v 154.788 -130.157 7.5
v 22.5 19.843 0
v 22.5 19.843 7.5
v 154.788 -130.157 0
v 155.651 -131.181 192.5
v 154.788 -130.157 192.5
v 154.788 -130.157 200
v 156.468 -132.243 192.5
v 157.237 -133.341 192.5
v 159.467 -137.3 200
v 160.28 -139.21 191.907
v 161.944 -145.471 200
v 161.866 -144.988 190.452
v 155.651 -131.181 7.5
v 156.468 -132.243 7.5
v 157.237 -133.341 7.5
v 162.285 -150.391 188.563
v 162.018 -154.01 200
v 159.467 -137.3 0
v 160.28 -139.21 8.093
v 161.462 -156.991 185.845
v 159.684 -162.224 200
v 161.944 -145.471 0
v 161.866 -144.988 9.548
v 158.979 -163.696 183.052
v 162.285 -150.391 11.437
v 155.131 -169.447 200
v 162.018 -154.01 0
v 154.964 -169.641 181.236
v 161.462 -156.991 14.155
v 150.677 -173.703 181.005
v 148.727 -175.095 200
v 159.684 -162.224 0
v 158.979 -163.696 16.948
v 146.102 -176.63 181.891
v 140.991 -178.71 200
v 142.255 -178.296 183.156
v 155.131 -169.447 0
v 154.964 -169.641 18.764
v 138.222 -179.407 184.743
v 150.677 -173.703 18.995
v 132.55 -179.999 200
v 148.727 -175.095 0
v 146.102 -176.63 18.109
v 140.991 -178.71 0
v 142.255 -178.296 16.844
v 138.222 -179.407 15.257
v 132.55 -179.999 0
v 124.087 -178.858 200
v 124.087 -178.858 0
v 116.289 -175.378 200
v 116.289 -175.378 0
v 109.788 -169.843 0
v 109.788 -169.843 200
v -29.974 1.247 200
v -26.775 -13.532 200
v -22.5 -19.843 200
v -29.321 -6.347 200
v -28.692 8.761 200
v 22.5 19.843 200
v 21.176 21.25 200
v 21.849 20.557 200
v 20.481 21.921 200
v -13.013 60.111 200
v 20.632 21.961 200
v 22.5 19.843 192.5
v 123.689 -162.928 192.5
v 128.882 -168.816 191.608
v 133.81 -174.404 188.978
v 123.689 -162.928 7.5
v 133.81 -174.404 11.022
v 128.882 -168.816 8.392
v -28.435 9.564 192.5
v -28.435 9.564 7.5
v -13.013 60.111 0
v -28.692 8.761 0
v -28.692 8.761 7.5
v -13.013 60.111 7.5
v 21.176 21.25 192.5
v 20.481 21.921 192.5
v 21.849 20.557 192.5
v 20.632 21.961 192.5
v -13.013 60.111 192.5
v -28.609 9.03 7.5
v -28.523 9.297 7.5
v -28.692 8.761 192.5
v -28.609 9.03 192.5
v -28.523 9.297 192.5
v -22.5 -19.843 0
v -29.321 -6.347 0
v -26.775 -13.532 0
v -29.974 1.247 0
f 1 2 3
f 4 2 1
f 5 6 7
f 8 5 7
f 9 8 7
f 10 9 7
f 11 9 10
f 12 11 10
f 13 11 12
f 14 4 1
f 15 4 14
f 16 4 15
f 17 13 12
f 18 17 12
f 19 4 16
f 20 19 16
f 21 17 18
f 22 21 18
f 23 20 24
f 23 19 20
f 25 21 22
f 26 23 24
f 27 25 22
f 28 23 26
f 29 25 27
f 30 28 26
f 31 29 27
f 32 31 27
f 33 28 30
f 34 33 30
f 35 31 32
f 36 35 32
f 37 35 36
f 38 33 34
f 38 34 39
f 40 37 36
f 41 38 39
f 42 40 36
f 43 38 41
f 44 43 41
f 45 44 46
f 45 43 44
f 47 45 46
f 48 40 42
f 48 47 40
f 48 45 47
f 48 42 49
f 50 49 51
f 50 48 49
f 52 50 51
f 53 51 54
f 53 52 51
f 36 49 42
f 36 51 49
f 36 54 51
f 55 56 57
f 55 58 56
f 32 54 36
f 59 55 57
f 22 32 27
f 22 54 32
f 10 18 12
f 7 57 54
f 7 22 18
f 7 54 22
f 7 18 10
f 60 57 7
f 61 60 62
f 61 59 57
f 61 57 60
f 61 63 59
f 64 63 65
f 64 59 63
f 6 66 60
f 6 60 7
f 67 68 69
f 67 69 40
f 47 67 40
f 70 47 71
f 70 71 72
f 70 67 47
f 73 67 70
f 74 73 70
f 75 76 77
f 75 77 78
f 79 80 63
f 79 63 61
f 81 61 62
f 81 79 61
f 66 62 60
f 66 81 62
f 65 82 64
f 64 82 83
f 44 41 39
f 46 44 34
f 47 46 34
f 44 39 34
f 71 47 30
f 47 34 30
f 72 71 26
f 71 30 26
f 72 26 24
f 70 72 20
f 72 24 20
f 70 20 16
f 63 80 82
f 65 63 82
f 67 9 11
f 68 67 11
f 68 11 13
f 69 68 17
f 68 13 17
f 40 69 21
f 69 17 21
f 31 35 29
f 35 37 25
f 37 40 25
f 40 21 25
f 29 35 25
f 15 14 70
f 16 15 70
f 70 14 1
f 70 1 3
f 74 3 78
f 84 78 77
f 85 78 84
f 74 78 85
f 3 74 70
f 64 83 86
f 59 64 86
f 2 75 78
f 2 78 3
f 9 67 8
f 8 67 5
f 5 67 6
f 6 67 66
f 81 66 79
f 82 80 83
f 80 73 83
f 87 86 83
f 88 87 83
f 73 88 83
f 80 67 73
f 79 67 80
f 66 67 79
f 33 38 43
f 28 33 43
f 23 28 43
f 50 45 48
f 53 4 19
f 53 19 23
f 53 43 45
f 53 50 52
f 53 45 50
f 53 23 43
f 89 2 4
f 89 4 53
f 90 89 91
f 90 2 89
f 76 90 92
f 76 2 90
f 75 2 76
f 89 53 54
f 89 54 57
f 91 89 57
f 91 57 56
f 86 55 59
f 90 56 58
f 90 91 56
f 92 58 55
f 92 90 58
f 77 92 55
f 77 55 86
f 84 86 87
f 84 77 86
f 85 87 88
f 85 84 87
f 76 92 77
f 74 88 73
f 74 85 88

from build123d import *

# Parameters (mm, degrees)
BOSS_EXTRUDE4_DEPTH = 200
CUT_EXTRUDE5_DEPTH  = 45
BOSS_EXTRUDE5_DEPTH = 7.5
BOSS_EXTRUDE6_DEPTH = 7.5


with BuildPart() as part:
    # Sketch1 → Boss-Extrude4 (new body)
    with BuildSketch(Plane.XY):
        with BuildLine():
            Line((22.5, 19.843134833), (154.787565553, -130.156865167))
            ThreePointArc((154.787565553, -130.156865167), (152.130700386, -172.5), (109.787565553, -169.843134833))
            Line((109.787565553, -169.843134833), (-22.5, -19.843134833))
            ThreePointArc((-22.5, -19.843134833), (-19.843134833, 22.5), (22.5, 19.843134833))
        make_face()
    extrude(amount=BOSS_EXTRUDE4_DEPTH)

    # Sketch4 → Cut-Extrude5 (cut)
    with BuildSketch(Plane(origin=(22.5, 19.843134833, 0), x_dir=(0, 0, -1), z_dir=(0.75, 0.661437828, 0))):
        with BuildLine():
            Line((-192.5, 51.321419616), (-192.5, -204.008189627))
            ThreePointArc((-192.5, -204.008189627), (-182.248737342, -228.756926968), (-157.5, -239.008189627))
            Line((-157.5, -239.008189627), (-42.5, -239.008189627))
            ThreePointArc((-42.5, -239.008189627), (-17.751262658, -228.756926968), (-7.5, -204.008189627))
            Line((-7.5, -204.008189627), (-7.5, 51.321419616))
            Line((-7.5, 51.321419616), (-192.5, 51.321419616))
        make_face()
    extrude(amount=-CUT_EXTRUDE5_DEPTH, mode=Mode.SUBTRACT)

    # Sketch5 → Boss-Extrude5 (add)
    with BuildSketch(Plane(origin=(0, 0, 0), x_dir=(-1, 0, 0), z_dir=(0, 0, -1))):
        with BuildLine():
            ThreePointArc((-22.5, 19.843134833), (6.347313412, 29.320839218), (28.692196557, 8.761156129))
            Line((28.692196557, 8.761156129), (13.012632005, 60.110674556))
            Line((13.012632005, 60.110674556), (-22.5, 19.843134833))
        make_face()
    extrude(amount=-BOSS_EXTRUDE5_DEPTH)

    # Sketch6 → Boss-Extrude6 (add)
    with BuildSketch(Plane(origin=(0, 0, 192.5), x_dir=(-1, 0, 0), z_dir=(0, 0, -1))):
        Polygon((-20.631911768, 21.961347785), (13.012632005, 60.110674556), (28.692196557, 8.761156129), align=None)
    extrude(amount=-BOSS_EXTRUDE6_DEPTH)


solid = part.part
